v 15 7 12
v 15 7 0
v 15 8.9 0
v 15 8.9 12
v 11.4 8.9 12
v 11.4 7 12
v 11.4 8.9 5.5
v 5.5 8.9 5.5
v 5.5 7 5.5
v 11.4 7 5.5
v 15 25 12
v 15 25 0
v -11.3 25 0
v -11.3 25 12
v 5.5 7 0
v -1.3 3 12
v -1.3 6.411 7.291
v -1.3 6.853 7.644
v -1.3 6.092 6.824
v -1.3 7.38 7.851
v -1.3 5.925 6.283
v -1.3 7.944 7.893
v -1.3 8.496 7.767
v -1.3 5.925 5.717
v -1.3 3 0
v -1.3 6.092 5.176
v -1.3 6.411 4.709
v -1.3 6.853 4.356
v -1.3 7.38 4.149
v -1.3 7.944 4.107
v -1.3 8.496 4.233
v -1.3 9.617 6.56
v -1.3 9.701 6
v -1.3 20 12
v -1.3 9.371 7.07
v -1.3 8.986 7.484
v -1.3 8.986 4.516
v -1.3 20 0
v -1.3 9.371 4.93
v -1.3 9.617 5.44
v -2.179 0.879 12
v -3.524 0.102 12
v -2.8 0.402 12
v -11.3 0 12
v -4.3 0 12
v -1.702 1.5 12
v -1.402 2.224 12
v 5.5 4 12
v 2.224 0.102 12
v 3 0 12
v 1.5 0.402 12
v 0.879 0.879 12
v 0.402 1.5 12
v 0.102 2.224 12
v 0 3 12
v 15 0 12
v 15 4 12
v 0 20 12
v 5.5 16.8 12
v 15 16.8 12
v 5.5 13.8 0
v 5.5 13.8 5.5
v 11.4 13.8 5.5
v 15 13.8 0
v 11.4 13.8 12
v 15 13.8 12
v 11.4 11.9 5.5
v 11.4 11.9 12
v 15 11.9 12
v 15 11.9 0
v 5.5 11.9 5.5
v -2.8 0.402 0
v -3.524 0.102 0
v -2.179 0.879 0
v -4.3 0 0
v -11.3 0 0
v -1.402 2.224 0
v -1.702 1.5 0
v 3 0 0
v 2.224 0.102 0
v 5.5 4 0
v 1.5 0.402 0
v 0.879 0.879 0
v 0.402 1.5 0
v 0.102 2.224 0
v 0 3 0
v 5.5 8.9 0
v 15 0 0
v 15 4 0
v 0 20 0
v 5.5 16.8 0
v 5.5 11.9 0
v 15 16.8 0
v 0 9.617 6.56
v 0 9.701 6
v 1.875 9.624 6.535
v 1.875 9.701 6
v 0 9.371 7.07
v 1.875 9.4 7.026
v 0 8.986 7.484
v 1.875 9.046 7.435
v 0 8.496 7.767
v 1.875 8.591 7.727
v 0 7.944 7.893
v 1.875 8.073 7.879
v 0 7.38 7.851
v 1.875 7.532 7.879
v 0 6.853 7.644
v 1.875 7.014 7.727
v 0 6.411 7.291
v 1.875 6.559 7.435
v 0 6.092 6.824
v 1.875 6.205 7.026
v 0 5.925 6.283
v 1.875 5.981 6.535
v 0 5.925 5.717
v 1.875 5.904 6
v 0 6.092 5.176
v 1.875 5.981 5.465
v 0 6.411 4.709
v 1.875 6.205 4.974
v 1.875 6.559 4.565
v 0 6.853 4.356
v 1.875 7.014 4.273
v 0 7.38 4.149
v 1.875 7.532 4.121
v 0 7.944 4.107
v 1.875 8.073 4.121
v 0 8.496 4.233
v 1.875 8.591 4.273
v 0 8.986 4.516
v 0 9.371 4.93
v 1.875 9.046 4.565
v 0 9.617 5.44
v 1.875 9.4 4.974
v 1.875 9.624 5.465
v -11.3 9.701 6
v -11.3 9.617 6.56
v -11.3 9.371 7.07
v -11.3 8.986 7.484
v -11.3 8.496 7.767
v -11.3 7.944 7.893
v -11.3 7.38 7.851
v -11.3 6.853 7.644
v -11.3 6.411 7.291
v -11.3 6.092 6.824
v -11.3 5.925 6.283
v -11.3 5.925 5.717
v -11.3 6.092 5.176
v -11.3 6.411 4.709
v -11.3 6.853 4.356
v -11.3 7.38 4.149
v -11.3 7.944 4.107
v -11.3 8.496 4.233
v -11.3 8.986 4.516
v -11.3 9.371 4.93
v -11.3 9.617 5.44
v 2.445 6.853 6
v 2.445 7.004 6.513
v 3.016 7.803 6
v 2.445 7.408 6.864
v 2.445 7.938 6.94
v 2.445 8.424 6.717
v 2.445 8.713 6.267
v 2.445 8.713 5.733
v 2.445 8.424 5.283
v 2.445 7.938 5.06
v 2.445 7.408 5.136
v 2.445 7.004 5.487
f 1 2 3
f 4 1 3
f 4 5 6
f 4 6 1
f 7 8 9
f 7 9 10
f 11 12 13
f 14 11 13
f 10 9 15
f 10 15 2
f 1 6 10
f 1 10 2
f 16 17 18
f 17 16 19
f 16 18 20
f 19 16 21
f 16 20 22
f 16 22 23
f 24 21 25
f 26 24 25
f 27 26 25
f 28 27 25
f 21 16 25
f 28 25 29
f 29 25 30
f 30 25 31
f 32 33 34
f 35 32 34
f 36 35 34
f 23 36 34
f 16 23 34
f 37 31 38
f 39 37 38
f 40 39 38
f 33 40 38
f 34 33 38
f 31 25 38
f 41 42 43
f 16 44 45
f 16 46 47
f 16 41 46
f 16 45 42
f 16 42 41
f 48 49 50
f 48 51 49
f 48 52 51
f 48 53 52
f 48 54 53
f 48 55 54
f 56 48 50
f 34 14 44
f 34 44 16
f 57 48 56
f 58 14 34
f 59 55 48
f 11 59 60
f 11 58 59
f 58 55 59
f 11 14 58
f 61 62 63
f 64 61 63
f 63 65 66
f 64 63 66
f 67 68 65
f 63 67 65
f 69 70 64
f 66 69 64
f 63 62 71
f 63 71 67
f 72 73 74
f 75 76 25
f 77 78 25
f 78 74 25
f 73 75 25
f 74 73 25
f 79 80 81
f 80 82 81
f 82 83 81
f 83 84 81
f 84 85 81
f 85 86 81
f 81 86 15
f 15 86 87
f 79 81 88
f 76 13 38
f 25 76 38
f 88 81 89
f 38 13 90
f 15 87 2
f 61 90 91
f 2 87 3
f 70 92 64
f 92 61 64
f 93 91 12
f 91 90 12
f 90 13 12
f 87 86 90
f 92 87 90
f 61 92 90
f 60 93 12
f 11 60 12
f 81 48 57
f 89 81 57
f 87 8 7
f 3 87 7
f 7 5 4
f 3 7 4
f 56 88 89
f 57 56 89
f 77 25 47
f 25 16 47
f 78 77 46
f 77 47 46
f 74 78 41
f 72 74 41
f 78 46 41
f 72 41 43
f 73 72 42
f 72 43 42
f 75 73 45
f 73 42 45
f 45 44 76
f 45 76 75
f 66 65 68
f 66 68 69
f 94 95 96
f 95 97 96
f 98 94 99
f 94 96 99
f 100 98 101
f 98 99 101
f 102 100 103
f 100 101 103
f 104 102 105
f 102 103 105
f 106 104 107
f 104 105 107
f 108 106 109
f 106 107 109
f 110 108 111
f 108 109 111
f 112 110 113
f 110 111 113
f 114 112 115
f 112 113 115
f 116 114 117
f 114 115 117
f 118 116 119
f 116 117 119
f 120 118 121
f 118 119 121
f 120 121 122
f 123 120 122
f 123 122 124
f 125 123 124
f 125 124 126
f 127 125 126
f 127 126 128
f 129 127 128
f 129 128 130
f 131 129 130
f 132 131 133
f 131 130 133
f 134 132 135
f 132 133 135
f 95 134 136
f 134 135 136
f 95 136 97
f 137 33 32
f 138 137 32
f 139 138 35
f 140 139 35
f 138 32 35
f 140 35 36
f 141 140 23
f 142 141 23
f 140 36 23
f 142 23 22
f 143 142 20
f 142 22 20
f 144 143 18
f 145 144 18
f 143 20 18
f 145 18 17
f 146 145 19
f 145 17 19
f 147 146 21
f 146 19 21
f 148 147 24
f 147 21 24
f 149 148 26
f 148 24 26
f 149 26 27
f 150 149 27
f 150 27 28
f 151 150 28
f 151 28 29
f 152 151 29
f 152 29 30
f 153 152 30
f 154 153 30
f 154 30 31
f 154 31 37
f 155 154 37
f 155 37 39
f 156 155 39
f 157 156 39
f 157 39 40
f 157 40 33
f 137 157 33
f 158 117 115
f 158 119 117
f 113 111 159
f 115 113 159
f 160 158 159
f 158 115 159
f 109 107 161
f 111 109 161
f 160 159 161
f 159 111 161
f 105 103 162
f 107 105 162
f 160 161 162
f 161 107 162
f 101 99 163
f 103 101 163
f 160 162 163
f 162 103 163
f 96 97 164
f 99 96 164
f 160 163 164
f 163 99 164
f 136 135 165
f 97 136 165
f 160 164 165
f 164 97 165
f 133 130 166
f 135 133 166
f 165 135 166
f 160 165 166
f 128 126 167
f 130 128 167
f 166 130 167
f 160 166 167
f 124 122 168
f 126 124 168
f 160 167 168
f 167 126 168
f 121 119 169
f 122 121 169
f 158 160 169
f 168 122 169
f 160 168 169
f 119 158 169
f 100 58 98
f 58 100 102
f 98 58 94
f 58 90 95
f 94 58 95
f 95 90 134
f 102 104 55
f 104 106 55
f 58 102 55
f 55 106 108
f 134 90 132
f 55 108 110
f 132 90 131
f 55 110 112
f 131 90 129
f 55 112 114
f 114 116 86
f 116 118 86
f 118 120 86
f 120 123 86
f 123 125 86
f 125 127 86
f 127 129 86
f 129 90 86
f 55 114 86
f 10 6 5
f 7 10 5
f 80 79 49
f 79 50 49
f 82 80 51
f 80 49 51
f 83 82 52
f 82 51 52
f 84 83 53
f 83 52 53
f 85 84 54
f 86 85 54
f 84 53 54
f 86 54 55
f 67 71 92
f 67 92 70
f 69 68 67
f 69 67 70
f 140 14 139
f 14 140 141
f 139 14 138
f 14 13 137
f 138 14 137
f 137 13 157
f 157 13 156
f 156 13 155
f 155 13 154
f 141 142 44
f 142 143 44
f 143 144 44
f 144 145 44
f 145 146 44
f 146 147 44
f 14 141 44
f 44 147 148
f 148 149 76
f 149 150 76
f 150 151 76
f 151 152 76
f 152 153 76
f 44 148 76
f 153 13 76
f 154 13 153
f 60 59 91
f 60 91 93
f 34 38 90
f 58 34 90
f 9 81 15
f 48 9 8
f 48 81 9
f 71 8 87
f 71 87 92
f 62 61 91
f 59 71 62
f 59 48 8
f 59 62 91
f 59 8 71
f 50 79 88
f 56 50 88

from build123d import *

# Parameters (mm, degrees)
F1_DEPTH = 12
F2_W     = 5.9
F2_H     = 12.8
F3_DEPTH = 6.5
F4_W     = 9.5
F4_H     = 3
F5_DEPTH = 12.001
F6_R     = 3
F8_D     = 3.7973
F8_DEPTH = 13.175
F8_TIP   = 1.1408240143


with BuildPart() as f1:
    # F0 (on Top) → F1 (new body)
    with BuildSketch(Plane.XY):
        Polygon((0, 25), (-11.3, 25), (-11.3, 0), (-1.3, 0), (-1.3, 20), (0, 20), align=None)
        Polygon((15, 25), (0, 25), (0, 20), (0, 0), (15, 0), align=None)
    extrude(amount=F1_DEPTH)

    # F2 (on face) → F3 (cut)
    with BuildSketch(Plane.XY.offset(12)):
        with Locations((8.45, 10.4)):
            Rectangle(F2_W, F2_H)
    extrude(amount=-F3_DEPTH, mode=Mode.SUBTRACT)

    # F4 (on face) → F5 (cut, through all)
    with BuildSketch(Plane.XY.offset(12)):
        with Locations((10.25, 5.5)):
            Rectangle(F4_W, F4_H)
        with Locations((10.25, 10.4)):
            Rectangle(F4_W, F4_H)
        with Locations((10.25, 15.3)):
            Rectangle(F4_W, F4_H)
    extrude(amount=-F5_DEPTH, mode=Mode.SUBTRACT)

    # F6
    f6_edges = [f1.edges().sort_by_distance(p)[0] for p in [
        (-1.3, 0, 6),
        (0, 0, 6),
    ]]
    fillet(f6_edges, radius=F6_R)

    # F8
    with Locations(Plane(origin=(-11.3, 0, 0), x_dir=(0, -1, 0), z_dir=(-1, 0, 0))):
        with Locations((-7.8025250696, 6)):
            Hole(F8_D / 2, depth=F8_DEPTH)
            with Locations((0, 0, -(F8_DEPTH + F8_TIP / 2))):  # 118° drill point
                Cone(0, F8_D / 2, F8_TIP, mode=Mode.SUBTRACT)


solid = f1.part
